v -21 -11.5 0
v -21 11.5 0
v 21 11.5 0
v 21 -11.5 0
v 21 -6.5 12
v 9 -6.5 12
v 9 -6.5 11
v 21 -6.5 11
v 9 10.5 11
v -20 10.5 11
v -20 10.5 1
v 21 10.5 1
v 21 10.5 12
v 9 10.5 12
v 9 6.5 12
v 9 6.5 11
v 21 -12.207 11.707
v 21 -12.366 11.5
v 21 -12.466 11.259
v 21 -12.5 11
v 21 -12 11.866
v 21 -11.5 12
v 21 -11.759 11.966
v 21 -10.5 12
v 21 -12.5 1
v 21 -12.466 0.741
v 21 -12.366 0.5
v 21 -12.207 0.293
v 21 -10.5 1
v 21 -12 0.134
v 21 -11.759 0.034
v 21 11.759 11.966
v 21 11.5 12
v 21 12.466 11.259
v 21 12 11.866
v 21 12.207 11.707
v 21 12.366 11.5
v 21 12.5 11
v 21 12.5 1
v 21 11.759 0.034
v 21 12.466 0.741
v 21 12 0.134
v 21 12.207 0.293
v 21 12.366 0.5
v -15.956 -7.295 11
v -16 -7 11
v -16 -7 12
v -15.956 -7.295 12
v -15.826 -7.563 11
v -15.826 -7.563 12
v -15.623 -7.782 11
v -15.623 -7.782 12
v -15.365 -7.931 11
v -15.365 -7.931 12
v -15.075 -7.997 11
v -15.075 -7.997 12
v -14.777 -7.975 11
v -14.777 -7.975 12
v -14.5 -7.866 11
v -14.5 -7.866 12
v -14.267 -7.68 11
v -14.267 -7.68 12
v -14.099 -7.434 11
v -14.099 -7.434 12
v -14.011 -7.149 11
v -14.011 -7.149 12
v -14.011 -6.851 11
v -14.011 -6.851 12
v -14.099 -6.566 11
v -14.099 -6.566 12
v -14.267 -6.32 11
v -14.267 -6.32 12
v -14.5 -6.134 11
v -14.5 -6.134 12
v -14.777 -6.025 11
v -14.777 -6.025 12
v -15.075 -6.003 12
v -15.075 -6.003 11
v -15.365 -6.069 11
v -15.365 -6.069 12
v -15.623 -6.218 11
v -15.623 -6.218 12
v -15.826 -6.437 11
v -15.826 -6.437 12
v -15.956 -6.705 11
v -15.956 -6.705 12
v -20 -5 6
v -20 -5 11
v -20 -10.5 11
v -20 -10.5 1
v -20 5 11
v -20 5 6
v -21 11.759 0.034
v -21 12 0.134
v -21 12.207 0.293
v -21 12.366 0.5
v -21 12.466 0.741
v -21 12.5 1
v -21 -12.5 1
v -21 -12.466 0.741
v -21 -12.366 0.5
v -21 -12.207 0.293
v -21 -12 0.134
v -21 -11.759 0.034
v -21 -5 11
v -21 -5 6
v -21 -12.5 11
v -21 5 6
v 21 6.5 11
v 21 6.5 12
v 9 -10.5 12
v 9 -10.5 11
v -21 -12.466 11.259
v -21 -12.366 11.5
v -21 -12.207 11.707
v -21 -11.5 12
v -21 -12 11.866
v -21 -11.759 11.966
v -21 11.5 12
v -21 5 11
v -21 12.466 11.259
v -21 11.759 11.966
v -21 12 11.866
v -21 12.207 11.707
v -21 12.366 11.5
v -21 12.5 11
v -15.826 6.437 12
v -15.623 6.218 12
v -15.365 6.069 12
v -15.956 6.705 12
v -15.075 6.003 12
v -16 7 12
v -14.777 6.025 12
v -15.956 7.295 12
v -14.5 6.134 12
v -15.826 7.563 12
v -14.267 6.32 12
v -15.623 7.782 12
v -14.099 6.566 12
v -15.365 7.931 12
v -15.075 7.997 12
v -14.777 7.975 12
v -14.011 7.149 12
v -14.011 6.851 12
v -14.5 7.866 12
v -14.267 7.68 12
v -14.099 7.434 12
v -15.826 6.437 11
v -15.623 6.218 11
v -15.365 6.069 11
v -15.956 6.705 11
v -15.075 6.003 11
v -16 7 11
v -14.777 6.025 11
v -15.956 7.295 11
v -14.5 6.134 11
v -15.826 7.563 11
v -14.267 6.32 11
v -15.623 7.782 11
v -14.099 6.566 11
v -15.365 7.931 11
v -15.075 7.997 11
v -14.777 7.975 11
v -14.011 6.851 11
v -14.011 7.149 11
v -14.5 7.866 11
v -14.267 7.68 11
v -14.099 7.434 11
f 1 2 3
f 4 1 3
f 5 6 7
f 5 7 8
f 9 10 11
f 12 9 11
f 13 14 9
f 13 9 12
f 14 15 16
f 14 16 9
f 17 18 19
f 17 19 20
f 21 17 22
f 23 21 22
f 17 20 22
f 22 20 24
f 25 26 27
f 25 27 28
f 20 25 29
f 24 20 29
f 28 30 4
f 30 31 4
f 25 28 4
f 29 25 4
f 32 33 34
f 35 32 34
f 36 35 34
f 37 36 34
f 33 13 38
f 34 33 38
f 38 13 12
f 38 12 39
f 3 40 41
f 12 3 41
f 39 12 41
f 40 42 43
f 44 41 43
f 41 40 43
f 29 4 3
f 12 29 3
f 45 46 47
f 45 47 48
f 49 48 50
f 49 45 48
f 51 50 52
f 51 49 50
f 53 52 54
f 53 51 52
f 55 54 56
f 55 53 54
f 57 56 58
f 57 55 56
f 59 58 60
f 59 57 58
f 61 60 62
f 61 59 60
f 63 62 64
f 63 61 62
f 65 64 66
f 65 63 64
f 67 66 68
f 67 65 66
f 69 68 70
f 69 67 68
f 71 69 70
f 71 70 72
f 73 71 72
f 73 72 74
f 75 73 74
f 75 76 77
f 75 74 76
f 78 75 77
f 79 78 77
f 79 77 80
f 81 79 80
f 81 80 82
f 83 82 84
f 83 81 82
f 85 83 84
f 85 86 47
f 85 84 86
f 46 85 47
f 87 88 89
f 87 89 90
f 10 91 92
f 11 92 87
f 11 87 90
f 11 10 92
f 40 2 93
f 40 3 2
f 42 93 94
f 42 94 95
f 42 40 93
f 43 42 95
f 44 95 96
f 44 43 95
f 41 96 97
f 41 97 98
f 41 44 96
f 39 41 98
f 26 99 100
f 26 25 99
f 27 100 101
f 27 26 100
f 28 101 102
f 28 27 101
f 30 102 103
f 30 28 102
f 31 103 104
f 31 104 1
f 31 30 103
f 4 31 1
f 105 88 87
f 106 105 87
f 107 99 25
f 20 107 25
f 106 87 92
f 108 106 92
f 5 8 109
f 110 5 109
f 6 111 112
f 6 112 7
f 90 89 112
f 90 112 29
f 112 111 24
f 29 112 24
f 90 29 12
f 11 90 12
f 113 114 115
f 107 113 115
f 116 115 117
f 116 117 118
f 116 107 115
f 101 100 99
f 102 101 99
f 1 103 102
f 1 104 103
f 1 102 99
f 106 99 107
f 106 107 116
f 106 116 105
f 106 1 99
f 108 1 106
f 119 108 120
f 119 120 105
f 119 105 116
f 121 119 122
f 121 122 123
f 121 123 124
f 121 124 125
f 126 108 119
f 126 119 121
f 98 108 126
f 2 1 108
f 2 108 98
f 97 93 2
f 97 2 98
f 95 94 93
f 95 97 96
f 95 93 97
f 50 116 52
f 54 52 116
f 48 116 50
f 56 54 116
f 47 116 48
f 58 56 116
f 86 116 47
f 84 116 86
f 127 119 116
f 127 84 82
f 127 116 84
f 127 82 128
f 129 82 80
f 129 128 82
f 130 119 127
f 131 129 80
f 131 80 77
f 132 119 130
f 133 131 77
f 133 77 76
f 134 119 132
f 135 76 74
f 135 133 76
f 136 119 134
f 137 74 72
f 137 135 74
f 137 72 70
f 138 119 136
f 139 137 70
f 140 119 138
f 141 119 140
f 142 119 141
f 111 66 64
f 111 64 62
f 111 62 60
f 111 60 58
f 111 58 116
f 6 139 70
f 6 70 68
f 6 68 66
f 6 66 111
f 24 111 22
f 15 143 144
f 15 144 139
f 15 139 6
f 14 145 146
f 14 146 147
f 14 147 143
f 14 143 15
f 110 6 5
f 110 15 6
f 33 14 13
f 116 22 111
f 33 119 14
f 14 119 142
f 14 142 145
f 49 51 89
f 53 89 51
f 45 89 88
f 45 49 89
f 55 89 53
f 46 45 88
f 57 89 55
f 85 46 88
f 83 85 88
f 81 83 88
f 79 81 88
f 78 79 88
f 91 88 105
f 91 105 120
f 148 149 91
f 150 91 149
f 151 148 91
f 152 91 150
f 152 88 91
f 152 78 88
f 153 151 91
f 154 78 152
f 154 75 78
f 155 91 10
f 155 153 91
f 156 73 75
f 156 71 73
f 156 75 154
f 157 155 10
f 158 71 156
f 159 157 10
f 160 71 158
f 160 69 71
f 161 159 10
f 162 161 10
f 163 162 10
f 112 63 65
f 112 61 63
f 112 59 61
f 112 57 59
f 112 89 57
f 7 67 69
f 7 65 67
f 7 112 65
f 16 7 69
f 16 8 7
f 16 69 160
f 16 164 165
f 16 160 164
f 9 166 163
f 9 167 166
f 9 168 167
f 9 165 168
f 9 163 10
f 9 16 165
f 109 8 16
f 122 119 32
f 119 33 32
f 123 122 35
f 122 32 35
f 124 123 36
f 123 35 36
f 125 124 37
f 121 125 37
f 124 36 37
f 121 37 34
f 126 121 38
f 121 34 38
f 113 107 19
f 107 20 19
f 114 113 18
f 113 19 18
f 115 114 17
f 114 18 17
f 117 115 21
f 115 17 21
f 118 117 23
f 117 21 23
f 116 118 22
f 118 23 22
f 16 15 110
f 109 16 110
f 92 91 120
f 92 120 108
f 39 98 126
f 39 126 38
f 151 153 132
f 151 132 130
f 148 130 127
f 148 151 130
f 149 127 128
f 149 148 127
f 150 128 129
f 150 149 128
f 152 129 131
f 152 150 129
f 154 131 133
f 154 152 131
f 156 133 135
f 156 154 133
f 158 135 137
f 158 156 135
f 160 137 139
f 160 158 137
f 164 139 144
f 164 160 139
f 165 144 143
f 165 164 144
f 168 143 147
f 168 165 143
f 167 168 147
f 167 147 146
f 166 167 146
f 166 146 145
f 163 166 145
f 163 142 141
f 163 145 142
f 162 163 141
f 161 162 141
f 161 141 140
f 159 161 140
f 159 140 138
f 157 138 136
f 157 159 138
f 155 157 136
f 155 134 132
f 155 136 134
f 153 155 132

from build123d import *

# Parameters (mm, degrees)
SKETCH_1_W               = 42
SKETCH_1_H               = 25
EXTRUDE_1_DEPTH          = 12
SKETCH_3_W               = 10
SKETCH_3_H               = 21
CUT_EXTRUDE_1_DEPTH      = 41
SKETCH_4_W               = 5
SKETCH_4_H               = 10
CUT_EXTRUDE_2_DEPTH      = 10
SKETCH_5_W               = 12
SKETCH_5_H               = 4
CUT_EXTRUDE_3_DEPTH      = 10
CUT_EXTRUDE_4_DEPTH      = 10
CUT_EXTRUDE_4_DEPTH_BACK = 10
SKETCH_6_R               = 1
FILLET_1_R               = 1


with BuildPart() as part:
    # 草图1 → 凸台-拉伸1 (new body)
    with BuildSketch(Plane.XY):
        Rectangle(SKETCH_1_W, SKETCH_1_H)
    extrude(amount=EXTRUDE_1_DEPTH)

    # 草图3 → 切除-拉伸1 (cut)
    with BuildSketch(Plane(origin=(21, 0, 0), x_dir=(0, 0, -1), z_dir=(1, 0, 0))):
        with Locations((-6, 0)):
            Rectangle(SKETCH_3_W, SKETCH_3_H)
    extrude(amount=-CUT_EXTRUDE_1_DEPTH, mode=Mode.SUBTRACT)

    # 草图4 → 切除-拉伸2 (cut)
    with BuildSketch(Plane(origin=(-20, 0, 0), x_dir=(0, 0, -1), z_dir=(1, 0, 0))):
        with Locations((-8.5, 0)):
            Rectangle(SKETCH_4_W, SKETCH_4_H)
    extrude(amount=-CUT_EXTRUDE_2_DEPTH, mode=Mode.SUBTRACT)

    # 草图5 → 切除-拉伸3 (cut)
    with BuildSketch(Plane.XY.offset(12)):
        with Locations((15, 8.5)):
            Rectangle(SKETCH_5_W, SKETCH_5_H)
        with Locations((15, -8.5)):
            Rectangle(SKETCH_5_W, SKETCH_5_H)
    extrude(amount=-CUT_EXTRUDE_3_DEPTH, mode=Mode.SUBTRACT)

    # 草图6 → 切除-拉伸4 (cut, two sides: drawn at the far end of the back side and taken through both)
    with BuildSketch(Plane.XY.offset(12).offset(-CUT_EXTRUDE_4_DEPTH_BACK)):
        with Locations((-15, 7)):
            Circle(SKETCH_6_R)
        with Locations((-15, -7)):
            Circle(SKETCH_6_R)
    extrude(amount=CUT_EXTRUDE_4_DEPTH + CUT_EXTRUDE_4_DEPTH_BACK, mode=Mode.SUBTRACT)

    # 圆角1
    fillet_1_edges = [part.edges().sort_by_distance(p)[0] for p in [
        (0, -12.5, 0),
        (0, -12.5, 12),
        (0, 12.5, 0),
        (0, 12.5, 12),
    ]]
    fillet(fillet_1_edges, radius=FILLET_1_R)


solid = part.part
